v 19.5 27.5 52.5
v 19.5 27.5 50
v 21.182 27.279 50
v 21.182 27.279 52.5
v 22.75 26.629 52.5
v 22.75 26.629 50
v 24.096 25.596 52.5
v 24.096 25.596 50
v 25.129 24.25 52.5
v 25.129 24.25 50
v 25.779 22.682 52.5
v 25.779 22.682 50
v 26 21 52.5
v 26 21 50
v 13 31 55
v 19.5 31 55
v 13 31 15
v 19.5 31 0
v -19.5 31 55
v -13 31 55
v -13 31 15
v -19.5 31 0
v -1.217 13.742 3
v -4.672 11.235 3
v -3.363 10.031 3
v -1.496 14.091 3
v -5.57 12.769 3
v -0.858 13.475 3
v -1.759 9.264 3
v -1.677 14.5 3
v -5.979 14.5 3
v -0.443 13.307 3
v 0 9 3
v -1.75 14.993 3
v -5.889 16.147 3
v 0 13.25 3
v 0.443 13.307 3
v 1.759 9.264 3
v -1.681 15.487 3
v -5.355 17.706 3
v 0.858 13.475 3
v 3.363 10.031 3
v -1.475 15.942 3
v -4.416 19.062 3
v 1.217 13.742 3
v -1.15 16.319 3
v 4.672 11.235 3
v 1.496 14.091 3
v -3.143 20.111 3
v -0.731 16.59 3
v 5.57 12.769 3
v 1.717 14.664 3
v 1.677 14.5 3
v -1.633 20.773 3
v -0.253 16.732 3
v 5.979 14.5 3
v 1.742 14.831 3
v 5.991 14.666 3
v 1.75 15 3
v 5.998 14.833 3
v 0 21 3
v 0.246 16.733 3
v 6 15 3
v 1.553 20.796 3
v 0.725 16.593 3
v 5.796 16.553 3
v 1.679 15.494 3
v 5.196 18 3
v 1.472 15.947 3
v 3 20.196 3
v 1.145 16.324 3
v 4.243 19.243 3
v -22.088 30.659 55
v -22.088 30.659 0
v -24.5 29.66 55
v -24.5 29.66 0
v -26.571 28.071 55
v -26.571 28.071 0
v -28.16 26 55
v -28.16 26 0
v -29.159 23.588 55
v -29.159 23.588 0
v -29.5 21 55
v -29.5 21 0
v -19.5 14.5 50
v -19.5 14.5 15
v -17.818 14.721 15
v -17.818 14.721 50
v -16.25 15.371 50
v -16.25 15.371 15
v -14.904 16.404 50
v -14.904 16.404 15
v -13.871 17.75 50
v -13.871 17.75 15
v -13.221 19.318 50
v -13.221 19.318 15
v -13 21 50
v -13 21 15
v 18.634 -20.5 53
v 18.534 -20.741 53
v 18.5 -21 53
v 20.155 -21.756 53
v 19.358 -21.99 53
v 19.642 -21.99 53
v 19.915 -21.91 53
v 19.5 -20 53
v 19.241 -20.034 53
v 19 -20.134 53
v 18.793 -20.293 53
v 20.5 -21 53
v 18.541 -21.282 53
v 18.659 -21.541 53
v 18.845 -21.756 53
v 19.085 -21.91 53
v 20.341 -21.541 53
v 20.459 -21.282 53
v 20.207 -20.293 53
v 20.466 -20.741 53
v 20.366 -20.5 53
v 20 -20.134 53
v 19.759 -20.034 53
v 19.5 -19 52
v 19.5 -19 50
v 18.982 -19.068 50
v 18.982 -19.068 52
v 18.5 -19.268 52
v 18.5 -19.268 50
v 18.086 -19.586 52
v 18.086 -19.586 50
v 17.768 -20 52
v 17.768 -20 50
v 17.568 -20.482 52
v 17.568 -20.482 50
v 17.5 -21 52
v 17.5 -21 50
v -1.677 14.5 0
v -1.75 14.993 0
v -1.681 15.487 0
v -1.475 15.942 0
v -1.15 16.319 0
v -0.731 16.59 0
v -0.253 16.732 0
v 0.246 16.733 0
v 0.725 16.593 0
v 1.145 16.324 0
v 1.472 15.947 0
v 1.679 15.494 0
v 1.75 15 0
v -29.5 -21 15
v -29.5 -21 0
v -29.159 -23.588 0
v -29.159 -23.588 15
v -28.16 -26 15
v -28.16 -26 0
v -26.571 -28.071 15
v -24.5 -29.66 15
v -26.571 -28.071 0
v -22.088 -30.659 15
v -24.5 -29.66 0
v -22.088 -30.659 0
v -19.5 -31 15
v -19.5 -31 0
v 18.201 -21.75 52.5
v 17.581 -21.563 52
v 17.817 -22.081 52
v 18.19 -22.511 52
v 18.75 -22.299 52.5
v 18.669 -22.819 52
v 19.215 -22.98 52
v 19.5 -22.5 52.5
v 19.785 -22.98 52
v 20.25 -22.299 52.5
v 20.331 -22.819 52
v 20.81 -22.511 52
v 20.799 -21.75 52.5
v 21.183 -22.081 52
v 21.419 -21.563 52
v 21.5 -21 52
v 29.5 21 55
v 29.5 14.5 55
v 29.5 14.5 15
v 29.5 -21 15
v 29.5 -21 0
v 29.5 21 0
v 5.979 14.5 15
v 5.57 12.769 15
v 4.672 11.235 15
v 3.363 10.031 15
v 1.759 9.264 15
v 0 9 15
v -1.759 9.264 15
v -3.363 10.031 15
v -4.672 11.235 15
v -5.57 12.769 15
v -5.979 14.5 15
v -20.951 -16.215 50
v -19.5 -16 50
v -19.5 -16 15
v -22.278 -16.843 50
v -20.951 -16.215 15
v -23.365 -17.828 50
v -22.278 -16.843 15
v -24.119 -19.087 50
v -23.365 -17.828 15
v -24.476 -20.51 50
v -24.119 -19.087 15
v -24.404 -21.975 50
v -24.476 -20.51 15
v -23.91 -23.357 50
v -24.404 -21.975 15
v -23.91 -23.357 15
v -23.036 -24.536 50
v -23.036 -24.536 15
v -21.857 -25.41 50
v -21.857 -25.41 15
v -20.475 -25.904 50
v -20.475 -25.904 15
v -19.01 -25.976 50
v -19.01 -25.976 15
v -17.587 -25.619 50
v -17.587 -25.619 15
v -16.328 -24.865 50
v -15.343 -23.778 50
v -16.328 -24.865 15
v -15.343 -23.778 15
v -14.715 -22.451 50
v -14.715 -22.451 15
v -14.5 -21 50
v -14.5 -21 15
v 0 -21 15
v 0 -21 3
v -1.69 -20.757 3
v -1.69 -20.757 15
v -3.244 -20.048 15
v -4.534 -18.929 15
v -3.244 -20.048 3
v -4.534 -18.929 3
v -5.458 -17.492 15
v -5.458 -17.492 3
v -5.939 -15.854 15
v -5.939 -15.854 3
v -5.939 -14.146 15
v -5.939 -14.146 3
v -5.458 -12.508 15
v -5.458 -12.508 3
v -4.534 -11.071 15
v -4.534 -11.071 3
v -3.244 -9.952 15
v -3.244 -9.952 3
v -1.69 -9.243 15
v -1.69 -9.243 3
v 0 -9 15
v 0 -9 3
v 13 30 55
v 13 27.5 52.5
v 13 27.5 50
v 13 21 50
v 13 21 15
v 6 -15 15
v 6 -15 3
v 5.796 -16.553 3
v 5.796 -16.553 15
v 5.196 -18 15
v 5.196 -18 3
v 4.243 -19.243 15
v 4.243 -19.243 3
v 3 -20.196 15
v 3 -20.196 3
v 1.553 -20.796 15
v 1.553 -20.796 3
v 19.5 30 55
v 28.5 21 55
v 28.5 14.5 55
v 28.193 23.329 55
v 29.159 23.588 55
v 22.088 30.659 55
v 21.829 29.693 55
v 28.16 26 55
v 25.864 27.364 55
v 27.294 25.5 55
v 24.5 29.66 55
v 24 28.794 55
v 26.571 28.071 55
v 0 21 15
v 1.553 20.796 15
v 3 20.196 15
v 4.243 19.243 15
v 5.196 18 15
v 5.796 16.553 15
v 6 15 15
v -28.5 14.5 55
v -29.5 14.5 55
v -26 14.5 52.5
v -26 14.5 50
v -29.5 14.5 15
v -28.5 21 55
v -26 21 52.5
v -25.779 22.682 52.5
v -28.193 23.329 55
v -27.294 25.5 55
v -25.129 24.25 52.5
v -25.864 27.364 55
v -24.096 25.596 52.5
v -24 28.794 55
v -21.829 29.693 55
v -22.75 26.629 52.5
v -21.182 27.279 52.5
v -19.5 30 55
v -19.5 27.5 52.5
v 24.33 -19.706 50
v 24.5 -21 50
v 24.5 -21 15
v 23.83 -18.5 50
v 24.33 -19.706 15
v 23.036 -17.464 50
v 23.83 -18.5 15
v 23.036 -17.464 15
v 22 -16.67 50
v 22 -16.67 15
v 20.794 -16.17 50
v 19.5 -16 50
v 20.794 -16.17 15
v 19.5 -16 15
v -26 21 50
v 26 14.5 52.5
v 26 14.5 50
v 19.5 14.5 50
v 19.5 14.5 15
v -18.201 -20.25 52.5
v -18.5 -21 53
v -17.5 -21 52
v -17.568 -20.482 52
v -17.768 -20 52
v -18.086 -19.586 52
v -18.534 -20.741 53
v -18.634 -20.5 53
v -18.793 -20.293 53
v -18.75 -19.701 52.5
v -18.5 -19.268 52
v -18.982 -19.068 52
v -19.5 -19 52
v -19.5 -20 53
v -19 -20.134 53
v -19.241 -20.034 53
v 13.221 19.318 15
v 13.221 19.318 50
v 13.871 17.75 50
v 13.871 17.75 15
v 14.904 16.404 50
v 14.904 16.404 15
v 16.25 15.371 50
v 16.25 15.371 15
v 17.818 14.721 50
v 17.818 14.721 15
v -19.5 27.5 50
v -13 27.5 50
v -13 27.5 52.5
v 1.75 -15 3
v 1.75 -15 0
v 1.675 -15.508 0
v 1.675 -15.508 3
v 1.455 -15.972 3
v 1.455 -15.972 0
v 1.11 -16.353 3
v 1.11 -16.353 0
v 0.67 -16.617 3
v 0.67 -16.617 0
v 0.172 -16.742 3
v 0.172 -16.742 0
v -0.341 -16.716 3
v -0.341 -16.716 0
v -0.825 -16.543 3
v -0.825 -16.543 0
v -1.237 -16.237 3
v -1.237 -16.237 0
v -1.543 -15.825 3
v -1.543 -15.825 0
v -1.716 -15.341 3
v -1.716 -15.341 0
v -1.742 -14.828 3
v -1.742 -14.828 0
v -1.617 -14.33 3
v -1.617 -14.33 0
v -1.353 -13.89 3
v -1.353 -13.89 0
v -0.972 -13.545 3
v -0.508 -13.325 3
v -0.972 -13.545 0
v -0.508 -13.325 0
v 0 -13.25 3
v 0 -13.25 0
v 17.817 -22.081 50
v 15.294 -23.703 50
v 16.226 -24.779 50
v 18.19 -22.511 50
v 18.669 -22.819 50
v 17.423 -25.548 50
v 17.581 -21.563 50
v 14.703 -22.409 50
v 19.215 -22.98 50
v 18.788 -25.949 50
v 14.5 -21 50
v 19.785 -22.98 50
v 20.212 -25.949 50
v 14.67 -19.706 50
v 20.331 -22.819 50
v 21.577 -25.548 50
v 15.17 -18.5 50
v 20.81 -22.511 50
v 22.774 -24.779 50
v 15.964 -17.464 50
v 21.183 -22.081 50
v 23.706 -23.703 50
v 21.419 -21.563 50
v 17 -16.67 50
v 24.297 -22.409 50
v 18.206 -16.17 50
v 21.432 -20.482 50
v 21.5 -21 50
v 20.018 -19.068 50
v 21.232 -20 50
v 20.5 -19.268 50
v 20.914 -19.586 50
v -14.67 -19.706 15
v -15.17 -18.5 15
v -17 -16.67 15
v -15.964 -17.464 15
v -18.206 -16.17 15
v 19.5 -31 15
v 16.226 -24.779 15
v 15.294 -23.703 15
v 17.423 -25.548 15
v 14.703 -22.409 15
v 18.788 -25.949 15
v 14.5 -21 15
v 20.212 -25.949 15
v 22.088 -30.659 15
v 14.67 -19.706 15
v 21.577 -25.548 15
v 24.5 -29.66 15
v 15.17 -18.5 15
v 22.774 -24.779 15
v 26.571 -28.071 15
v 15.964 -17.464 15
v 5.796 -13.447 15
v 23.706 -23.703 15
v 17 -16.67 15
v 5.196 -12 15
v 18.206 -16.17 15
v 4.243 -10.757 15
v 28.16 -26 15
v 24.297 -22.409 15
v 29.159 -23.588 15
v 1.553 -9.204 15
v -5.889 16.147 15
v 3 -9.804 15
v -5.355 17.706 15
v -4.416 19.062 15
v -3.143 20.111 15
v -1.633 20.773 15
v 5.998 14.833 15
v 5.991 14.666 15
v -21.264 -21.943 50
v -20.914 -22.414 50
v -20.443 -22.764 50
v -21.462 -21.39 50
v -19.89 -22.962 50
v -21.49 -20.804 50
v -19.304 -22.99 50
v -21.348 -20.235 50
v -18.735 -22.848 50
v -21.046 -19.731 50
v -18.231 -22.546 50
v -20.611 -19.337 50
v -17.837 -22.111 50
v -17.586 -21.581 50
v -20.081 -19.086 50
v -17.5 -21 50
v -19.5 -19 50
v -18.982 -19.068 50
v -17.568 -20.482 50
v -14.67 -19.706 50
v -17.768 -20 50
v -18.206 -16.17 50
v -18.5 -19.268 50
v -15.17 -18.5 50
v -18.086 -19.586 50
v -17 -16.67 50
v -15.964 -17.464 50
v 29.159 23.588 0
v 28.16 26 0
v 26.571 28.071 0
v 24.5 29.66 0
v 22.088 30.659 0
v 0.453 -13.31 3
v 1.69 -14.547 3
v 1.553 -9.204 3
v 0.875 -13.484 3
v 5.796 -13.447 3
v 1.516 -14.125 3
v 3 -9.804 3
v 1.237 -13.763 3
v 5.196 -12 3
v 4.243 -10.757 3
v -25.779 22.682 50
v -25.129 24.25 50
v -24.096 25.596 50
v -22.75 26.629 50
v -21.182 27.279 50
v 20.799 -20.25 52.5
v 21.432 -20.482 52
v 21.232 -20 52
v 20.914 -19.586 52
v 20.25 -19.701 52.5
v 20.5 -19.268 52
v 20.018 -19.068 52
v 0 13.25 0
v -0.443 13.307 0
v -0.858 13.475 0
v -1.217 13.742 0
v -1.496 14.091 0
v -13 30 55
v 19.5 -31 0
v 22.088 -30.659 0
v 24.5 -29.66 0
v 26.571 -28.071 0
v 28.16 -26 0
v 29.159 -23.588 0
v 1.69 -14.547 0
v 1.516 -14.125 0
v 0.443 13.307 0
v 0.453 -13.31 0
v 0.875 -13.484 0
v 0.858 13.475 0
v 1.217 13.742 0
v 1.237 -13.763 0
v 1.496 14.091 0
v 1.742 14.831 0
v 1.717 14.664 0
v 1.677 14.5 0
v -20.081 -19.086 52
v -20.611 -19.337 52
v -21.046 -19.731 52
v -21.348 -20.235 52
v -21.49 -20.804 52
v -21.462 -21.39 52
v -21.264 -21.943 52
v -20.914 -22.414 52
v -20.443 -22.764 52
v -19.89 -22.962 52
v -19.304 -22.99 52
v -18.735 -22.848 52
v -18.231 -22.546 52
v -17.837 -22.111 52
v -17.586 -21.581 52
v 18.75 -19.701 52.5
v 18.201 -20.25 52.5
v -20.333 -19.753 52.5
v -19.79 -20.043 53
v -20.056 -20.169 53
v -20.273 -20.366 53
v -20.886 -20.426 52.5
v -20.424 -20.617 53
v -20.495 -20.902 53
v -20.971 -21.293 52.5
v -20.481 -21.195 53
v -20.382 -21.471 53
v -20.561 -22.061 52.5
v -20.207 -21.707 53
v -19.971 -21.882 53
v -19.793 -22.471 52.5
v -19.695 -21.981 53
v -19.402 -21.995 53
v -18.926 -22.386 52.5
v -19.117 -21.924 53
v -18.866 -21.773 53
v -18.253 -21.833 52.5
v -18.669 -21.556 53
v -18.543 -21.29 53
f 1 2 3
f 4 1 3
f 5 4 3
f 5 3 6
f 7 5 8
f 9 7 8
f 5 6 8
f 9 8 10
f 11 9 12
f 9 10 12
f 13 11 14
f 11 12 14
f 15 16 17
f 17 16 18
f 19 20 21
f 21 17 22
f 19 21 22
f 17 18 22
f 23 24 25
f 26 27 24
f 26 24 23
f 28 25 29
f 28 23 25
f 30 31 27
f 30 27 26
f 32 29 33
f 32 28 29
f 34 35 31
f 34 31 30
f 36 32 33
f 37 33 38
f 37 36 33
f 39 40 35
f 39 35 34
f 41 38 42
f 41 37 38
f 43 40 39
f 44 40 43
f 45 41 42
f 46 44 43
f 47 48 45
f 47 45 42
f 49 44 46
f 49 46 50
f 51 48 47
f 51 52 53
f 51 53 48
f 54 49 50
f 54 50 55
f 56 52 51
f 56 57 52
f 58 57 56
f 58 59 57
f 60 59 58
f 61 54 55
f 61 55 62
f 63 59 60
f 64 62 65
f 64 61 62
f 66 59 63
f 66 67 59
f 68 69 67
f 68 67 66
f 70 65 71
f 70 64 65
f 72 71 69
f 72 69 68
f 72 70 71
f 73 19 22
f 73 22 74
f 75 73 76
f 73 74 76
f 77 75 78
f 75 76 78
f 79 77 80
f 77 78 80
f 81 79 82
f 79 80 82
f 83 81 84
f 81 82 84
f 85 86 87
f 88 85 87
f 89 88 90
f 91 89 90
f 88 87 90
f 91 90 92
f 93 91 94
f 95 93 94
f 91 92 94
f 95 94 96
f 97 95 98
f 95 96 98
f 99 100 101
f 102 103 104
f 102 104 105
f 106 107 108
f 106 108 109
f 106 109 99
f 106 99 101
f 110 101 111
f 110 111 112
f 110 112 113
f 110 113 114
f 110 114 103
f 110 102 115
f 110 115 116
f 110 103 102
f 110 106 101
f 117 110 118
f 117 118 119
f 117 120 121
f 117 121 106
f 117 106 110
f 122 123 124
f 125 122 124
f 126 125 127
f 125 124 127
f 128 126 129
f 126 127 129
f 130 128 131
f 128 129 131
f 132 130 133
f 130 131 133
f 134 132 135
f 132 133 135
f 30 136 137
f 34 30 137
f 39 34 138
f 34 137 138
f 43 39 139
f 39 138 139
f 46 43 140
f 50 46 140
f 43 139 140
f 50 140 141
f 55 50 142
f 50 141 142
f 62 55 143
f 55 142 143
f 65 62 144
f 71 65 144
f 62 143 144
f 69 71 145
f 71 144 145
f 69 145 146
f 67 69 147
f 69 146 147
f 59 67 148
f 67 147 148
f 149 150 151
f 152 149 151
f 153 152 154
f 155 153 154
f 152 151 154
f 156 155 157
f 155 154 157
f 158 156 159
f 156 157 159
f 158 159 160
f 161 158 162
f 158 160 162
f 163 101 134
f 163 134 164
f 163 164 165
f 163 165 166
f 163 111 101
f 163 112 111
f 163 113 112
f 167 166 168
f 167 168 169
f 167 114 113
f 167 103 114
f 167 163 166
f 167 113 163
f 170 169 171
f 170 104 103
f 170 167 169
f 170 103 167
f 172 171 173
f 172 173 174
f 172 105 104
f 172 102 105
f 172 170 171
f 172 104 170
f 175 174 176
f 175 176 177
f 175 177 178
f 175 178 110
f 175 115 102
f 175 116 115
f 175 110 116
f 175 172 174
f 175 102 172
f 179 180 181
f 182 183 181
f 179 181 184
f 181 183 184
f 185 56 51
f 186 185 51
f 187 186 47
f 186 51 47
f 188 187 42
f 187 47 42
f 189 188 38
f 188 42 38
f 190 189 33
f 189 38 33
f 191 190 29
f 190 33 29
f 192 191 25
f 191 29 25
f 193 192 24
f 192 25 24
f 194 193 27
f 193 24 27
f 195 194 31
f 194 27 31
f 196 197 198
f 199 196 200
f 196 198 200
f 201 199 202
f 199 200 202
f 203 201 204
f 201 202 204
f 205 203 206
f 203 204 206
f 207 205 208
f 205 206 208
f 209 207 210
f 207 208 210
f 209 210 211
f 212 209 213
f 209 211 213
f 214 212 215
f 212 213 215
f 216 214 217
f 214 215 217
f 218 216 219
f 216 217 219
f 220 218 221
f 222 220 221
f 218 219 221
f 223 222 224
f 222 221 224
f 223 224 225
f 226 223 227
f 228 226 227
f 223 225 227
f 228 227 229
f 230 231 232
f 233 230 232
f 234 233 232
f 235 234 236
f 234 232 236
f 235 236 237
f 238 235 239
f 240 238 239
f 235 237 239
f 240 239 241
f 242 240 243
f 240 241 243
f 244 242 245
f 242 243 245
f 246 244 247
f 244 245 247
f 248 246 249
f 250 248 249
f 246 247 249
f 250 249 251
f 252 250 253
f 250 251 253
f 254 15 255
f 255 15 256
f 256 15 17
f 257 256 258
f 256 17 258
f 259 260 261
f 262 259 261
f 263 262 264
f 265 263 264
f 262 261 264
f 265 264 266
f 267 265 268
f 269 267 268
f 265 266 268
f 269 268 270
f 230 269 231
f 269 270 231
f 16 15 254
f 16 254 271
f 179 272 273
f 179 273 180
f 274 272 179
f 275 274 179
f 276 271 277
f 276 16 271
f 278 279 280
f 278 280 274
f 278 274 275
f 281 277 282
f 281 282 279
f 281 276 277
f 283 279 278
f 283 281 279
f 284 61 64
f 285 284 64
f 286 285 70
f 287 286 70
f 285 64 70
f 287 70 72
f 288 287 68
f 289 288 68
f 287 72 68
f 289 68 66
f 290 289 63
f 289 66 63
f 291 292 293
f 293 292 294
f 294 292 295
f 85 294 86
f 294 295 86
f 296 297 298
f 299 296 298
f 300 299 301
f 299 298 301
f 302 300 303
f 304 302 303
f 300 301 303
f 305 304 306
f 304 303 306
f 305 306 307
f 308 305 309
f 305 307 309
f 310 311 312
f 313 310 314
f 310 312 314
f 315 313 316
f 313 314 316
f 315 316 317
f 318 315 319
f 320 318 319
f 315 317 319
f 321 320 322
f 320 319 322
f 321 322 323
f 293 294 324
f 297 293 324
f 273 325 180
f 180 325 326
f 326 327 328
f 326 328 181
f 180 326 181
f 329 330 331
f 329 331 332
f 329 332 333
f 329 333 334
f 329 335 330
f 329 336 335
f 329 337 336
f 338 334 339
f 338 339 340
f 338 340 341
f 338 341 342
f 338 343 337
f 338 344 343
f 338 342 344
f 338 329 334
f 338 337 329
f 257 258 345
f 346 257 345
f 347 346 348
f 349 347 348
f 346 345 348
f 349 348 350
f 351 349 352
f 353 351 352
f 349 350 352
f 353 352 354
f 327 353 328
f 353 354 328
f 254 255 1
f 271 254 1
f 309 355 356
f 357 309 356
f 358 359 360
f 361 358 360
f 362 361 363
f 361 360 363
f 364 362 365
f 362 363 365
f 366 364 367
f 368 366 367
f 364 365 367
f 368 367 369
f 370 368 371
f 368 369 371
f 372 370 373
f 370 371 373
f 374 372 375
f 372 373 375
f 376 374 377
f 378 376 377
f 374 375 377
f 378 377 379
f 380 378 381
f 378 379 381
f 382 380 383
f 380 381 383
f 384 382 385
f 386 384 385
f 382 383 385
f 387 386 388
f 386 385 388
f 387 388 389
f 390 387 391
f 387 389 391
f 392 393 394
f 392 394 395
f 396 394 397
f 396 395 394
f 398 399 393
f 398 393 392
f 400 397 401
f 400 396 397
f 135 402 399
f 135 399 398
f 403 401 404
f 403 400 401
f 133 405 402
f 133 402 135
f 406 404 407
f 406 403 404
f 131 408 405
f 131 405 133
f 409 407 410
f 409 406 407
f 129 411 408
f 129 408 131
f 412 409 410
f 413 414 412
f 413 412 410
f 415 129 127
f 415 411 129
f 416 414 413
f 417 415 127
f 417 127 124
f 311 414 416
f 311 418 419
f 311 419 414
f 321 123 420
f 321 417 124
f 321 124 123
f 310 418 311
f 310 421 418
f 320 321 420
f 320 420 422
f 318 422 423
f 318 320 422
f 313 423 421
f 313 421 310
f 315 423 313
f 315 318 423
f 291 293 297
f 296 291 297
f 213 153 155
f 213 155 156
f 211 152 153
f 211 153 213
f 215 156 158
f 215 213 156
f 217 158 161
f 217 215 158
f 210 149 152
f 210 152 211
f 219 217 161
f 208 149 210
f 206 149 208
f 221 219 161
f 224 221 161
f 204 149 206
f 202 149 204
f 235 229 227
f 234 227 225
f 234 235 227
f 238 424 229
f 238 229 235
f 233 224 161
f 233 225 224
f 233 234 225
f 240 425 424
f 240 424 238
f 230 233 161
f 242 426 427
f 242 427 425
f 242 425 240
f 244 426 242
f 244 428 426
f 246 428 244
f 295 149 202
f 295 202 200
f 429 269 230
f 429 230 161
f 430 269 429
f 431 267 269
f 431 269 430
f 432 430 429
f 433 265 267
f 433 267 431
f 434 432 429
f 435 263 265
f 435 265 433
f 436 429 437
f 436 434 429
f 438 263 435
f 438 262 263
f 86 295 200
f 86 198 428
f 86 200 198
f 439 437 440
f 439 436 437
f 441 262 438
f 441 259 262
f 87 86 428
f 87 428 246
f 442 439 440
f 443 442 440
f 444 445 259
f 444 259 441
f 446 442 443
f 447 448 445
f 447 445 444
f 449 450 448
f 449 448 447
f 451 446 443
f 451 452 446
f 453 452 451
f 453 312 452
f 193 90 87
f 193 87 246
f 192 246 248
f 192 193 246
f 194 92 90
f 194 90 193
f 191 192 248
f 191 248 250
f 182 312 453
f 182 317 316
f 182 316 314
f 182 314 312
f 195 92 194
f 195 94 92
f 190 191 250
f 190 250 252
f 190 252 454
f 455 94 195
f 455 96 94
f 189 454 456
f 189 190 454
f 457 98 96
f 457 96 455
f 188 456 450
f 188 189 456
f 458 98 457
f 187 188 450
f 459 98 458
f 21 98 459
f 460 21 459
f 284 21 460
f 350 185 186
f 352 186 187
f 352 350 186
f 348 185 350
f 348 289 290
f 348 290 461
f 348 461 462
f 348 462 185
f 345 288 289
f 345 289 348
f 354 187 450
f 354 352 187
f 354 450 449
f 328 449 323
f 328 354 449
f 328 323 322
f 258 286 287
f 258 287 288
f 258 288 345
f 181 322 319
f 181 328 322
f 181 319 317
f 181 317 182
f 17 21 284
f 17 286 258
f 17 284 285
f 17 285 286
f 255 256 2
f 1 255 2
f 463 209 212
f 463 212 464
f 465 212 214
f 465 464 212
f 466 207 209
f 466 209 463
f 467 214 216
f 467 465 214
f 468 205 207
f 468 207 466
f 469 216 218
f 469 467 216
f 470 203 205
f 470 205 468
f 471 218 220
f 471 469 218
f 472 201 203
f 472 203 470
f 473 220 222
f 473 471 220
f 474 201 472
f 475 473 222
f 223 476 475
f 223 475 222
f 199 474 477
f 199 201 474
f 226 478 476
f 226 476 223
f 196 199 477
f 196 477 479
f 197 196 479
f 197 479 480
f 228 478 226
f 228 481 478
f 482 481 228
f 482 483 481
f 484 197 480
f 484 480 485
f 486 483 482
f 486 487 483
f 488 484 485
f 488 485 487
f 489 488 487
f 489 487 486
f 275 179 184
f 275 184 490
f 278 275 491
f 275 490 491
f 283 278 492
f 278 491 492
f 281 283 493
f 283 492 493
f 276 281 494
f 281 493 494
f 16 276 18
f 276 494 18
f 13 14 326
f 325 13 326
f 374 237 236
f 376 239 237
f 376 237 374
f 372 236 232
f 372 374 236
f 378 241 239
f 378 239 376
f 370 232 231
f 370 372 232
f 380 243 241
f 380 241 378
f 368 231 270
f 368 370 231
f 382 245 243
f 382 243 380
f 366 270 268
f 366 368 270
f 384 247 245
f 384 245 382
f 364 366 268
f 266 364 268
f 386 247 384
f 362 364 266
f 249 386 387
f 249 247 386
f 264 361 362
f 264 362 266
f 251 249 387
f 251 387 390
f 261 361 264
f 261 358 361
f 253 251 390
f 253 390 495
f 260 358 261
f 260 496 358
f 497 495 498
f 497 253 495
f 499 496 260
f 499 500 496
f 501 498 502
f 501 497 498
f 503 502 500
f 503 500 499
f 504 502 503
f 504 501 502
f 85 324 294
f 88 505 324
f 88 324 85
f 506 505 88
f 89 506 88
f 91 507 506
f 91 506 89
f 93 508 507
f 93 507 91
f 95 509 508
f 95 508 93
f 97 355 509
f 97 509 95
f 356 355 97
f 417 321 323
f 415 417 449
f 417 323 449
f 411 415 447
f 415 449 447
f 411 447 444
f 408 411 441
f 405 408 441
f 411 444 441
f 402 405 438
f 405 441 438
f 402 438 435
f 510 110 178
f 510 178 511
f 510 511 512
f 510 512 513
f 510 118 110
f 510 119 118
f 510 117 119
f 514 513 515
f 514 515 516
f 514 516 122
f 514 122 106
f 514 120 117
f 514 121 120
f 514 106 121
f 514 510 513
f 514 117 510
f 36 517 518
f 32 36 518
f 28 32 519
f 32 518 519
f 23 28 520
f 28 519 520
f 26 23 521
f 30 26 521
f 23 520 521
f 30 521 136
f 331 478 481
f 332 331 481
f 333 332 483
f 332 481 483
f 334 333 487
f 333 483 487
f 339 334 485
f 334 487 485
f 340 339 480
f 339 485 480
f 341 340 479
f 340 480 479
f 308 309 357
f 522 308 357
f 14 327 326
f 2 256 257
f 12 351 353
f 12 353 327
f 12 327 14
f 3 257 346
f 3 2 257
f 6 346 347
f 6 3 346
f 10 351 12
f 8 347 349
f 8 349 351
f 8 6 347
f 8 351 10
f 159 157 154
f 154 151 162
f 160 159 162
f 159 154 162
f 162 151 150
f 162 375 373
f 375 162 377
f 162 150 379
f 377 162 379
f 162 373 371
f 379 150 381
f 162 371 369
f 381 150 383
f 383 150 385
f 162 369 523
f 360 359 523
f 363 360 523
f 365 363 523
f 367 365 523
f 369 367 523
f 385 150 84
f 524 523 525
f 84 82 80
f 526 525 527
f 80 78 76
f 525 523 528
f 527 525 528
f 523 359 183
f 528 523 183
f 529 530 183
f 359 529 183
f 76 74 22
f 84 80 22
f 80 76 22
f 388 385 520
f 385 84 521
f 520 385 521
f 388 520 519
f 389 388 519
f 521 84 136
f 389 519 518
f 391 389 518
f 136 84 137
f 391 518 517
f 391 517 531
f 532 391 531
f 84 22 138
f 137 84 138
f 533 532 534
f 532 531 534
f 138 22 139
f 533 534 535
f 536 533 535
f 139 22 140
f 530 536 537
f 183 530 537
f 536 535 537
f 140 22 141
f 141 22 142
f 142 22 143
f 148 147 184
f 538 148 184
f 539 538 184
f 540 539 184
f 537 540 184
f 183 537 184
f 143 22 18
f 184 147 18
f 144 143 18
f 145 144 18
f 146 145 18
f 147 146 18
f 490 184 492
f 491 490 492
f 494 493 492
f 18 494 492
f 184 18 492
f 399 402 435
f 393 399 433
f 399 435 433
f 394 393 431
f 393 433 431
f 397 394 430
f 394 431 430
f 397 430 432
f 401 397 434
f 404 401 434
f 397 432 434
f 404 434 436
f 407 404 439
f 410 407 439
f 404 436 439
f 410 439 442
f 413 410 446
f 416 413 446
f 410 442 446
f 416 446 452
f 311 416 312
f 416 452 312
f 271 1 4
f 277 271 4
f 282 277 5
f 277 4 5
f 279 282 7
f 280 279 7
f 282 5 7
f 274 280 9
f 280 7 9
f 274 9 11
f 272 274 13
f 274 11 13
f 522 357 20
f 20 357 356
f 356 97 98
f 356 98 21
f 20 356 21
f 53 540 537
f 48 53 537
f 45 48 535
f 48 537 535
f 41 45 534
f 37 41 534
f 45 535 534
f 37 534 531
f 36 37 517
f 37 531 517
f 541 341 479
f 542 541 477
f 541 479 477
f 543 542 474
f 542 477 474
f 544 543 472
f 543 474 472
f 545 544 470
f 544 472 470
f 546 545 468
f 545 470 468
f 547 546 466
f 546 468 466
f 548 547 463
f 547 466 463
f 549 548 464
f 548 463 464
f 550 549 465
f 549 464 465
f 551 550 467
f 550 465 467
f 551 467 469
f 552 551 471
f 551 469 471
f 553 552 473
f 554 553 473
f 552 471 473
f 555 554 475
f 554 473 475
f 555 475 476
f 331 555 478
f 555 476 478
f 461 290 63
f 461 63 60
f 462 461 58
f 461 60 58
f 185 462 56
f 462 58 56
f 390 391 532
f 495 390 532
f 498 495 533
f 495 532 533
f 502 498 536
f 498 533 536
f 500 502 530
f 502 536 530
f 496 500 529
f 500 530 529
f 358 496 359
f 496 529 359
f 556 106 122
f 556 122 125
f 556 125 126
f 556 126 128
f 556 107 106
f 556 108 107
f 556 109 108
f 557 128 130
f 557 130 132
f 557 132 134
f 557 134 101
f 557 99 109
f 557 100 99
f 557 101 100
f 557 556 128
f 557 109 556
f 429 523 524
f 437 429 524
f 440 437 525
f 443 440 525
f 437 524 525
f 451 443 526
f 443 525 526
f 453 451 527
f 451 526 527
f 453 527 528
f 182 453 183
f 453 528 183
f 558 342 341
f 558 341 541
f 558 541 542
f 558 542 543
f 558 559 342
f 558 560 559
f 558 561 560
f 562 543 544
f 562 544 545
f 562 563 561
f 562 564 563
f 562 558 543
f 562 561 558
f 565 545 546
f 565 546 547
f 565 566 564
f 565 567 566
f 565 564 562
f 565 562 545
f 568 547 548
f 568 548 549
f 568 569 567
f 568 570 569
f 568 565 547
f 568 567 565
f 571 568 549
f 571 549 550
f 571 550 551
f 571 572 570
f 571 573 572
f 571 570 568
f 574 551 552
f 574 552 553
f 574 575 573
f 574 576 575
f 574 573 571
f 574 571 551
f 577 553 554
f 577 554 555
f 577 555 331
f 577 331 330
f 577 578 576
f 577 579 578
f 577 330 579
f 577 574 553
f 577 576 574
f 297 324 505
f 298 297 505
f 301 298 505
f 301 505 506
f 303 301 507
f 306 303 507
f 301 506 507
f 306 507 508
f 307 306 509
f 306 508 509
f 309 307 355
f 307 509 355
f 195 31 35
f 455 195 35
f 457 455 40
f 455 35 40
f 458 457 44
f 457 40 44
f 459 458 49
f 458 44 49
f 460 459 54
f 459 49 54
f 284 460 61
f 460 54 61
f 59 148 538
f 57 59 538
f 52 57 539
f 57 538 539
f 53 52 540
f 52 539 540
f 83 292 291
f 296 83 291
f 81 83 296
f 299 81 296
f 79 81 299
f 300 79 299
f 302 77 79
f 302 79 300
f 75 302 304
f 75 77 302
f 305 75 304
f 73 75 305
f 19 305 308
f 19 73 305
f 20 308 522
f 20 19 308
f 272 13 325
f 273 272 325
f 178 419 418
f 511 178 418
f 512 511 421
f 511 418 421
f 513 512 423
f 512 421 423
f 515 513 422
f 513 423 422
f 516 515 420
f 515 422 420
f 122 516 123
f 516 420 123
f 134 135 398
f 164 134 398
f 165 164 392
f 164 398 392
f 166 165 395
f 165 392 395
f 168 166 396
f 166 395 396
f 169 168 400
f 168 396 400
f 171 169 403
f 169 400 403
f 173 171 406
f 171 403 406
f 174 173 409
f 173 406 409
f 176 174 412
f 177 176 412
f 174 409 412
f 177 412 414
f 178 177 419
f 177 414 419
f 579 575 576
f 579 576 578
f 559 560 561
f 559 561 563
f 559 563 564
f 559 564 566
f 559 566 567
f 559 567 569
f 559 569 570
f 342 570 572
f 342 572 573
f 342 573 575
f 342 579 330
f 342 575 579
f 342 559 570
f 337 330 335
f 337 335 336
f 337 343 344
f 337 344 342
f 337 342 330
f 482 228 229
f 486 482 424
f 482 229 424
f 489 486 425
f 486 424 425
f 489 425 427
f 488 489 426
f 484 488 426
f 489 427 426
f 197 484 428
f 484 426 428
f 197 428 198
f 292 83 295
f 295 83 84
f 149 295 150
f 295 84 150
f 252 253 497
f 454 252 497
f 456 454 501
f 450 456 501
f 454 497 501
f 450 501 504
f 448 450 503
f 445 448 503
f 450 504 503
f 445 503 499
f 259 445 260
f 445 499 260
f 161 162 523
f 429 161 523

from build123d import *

# Parameters (mm, degrees)
F0_W     = 26
F0_H     = 3.5
F1_DEPTH = 15
F2_DEPTH = 50
F3_DEPTH = 53
F4_DEPTH = 3
F5_DEPTH = 55
F6_SIZE  = 2.5
F7_SIZE  = 1


# Not quite as in the source:
# - a feature names something its author has since deleted; it is built from what else it names


with BuildPart() as f1:
    # F0 (on Top) → F1 (new body)
    with BuildSketch(Plane.XY):
        with Locations((0, 29.25)):
            Rectangle(F0_W, F0_H)
        with BuildLine():
            Line((29.5, -21), (29.5, 14.5))
            Line((29.5, 14.5), (26, 14.5))
            Line((26, 14.5), (19.5, 14.5))
            Line((19.5, 14.5), (19.5, 0))
            Line((19.5, 0), (19.5, -16))
            ThreePointArc((19.5, -16), (23.0355339059, -17.4644660941), (24.5, -21))
            ThreePointArc((24.5, -21), (19.5, -26), (14.5, -21))
            Line((14.5, -21), (0, -21))
            Line((0, -21), (-14.5, -21))
            ThreePointArc((-14.5, -21), (-23.0355339059, -24.5355339059), (-19.5, -16))
            Line((-19.5, -16), (-19.5, 14.5))
            Line((-19.5, 14.5), (-26, 14.5))
            Line((-26, 14.5), (-29.5, 14.5))
            Line((-29.5, 14.5), (-29.5, -21))
            ThreePointArc((-29.5, -21), (-26.5710678119, -28.0710678119), (-19.5, -31))
            Line((-19.5, -31), (19.5, -31))
            ThreePointArc((19.5, -31), (26.5710678119, -28.0710678119), (29.5, -21))
        make_face()
        with BuildLine():
            Line((19.5, 0), (19.5, 14.5))
            Line((19.5, 14.5), (5.9791303716, 14.5))
            ThreePointArc((5.9791303716, 14.5), (4.0620192023, 10.5841195668), (0, 9))
            Line((0, 9), (0, 0))
            Line((0, 0), (19.5, 0))
        make_face()
        with BuildLine():
            Line((-5.9791303716, 14.5), (-19.5, 14.5))
            Line((-19.5, 14.5), (-19.5, -16))
            ThreePointArc((-19.5, -16), (-15.9644660941, -17.4644660941), (-14.5, -21))
            Line((-14.5, -21), (0, -21))
            ThreePointArc((0, -21), (-6, -15), (0, -9))
            Line((0, -9), (0, 0))
            Line((0, 0), (0, 9))
            ThreePointArc((0, 9), (-4.0620192023, 10.5841195668), (-5.9791303716, 14.5))
        make_face()
        with BuildLine():
            Line((19.5, -16), (19.5, 0))
            Line((19.5, 0), (0, 0))
            Line((0, 0), (0, -9))
            ThreePointArc((0, -9), (4.2426406871, -10.7573593129), (6, -15))
            ThreePointArc((6, -15), (4.2426406871, -19.2426406871), (0, -21))
            Line((0, -21), (14.5, -21))
            ThreePointArc((14.5, -21), (15.9644660941, -17.4644660941), (19.5, -16))
        make_face()
        Polygon((13, 21), (13, 27.5), (-13, 27.5), (-13, 21), (0, 21), align=None)
        with BuildLine():
            Line((0, 21), (-13, 21))
            ThreePointArc((-13, 21), (-14.9038059223, 16.4038059223), (-19.5, 14.5))
            Line((-19.5, 14.5), (-5.9791303716, 14.5))
            ThreePointArc((-5.9791303716, 14.5), (-4.4158804332, 19.0620192023), (0, 21))
        make_face()
        with BuildLine():
            ThreePointArc((19.5, 14.5), (14.9038059223, 16.4038059223), (13, 21))
            Line((13, 21), (0, 21))
            ThreePointArc((0, 21), (4.2426406871, 19.2426406871), (6, 15))
            ThreePointArc((6, 15), (5.9947803225, 14.7497823241), (5.9791303716, 14.5))
            Line((5.9791303716, 14.5), (19.5, 14.5))
        make_face()
    extrude(amount=F1_DEPTH)

    # F0 (on Top) → F2 (join)
    with BuildSketch(Plane.XY):
        with BuildLine():
            ThreePointArc((-13, 21), (-14.9038059223, 25.5961940777), (-19.5, 27.5))
            ThreePointArc((-19.5, 27.5), (-24.0961940777, 25.5961940777), (-26, 21))
            ThreePointArc((-26, 21), (-24.0961940777, 16.4038059223), (-19.5, 14.5))
            Line((-19.5, 14.5), (-19.5, 21))
            Line((-19.5, 21), (-13, 21))
        make_face()
        with BuildLine():
            ThreePointArc((-19.5, 14.5), (-14.9038059223, 16.4038059223), (-13, 21))
            Line((-13, 21), (-19.5, 21))
            Line((-19.5, 21), (-19.5, 14.5))
        make_face()
        with BuildLine():
            Line((-13, 21), (-13, 27.5))
            Line((-13, 27.5), (-19.5, 27.5))
            ThreePointArc((-19.5, 27.5), (-14.9038059223, 25.5961940777), (-13, 21))
        make_face()
        with BuildLine():
            ThreePointArc((26, 21), (24.0961940777, 25.5961940777), (19.5, 27.5))
            ThreePointArc((19.5, 27.5), (14.9038059223, 25.5961940777), (13, 21))
            Line((13, 21), (19.5, 21))
            Line((19.5, 21), (19.5, 14.5))
            ThreePointArc((19.5, 14.5), (24.0961940777, 16.4038059223), (26, 21))
        make_face()
        with BuildLine():
            Line((19.5, 21), (13, 21))
            ThreePointArc((13, 21), (14.9038059223, 16.4038059223), (19.5, 14.5))
            Line((19.5, 14.5), (19.5, 21))
        make_face()
        with BuildLine():
            ThreePointArc((24.5, -21), (23.0355339059, -17.4644660941), (19.5, -16))
            Line((19.5, -16), (19.5, -19))
            ThreePointArc((19.5, -19), (20.9142135624, -19.5857864376), (21.5, -21))
            ThreePointArc((21.5, -21), (19.5, -23), (17.5, -21))
            Line((17.5, -21), (14.5, -21))
            ThreePointArc((14.5, -21), (19.5, -26), (24.5, -21))
        make_face()
        with BuildLine():
            Line((19.5, -19), (19.5, -16))
            ThreePointArc((19.5, -16), (15.9644660941, -17.4644660941), (14.5, -21))
            Line((14.5, -21), (17.5, -21))
            ThreePointArc((17.5, -21), (18.0857864376, -19.5857864376), (19.5, -19))
        make_face()
        with BuildLine():
            Line((-19.5, -19), (-19.5, -16))
            ThreePointArc((-19.5, -16), (-23.0355339059, -24.5355339059), (-14.5, -21))
            Line((-14.5, -21), (-17.5, -21))
            ThreePointArc((-17.5, -21), (-20.9142135624, -22.4142135624), (-19.5, -19))
        make_face()
        with BuildLine():
            ThreePointArc((-14.5, -21), (-15.9644660941, -17.4644660941), (-19.5, -16))
            Line((-19.5, -16), (-19.5, -19))
            ThreePointArc((-19.5, -19), (-18.0857864376, -19.5857864376), (-17.5, -21))
            Line((-17.5, -21), (-14.5, -21))
        make_face()
        with BuildLine():
            Line((19.5, 27.5), (13, 27.5))
            Line((13, 27.5), (13, 21))
            ThreePointArc((13, 21), (14.9038059223, 25.5961940777), (19.5, 27.5))
        make_face()
        with BuildLine():
            Line((19.5, 14.5), (26, 14.5))
            Line((26, 14.5), (26, 21))
            ThreePointArc((26, 21), (24.0961940777, 16.4038059223), (19.5, 14.5))
        make_face()
        with BuildLine():
            ThreePointArc((-19.5, 14.5), (-24.0961940777, 16.4038059223), (-26, 21))
            Line((-26, 21), (-26, 14.5))
            Line((-26, 14.5), (-19.5, 14.5))
        make_face()
    extrude(amount=F2_DEPTH)

    # F0 (on Top) → F3 (join)
    with BuildSketch(Plane.XY):
        with BuildLine():
            Line((-19.5, -21), (-19.5, -19))
            ThreePointArc((-19.5, -19), (-20.9142135624, -22.4142135624), (-17.5, -21))
            Line((-17.5, -21), (-19.5, -21))
        make_face()
        with BuildLine():
            ThreePointArc((-17.5, -21), (-18.0857864376, -19.5857864376), (-19.5, -19))
            Line((-19.5, -19), (-19.5, -21))
            Line((-19.5, -21), (-17.5, -21))
        make_face()
        with BuildLine():
            Line((19.5, -21), (19.5, -19))
            ThreePointArc((19.5, -19), (18.0857864376, -19.5857864376), (17.5, -21))
            Line((17.5, -21), (19.5, -21))
        make_face()
        with BuildLine():
            ThreePointArc((21.5, -21), (20.9142135624, -19.5857864376), (19.5, -19))
            Line((19.5, -19), (19.5, -21))
            Line((19.5, -21), (17.5, -21))
            ThreePointArc((17.5, -21), (19.5, -23), (21.5, -21))
        make_face()
    extrude(amount=F3_DEPTH)

    # F0 (on Top) → F4 (join)
    with BuildSketch(Plane.XY):
        with BuildLine():
            Line((-1.6770509831, 14.5), (-5.9791303716, 14.5))
            ThreePointArc((-5.9791303716, 14.5), (-4.0620192023, 10.5841195668), (0, 9))
            Line((0, 9), (0, 13.25))
            ThreePointArc((0, 13.25), (-1.0458250332, 13.59687848), (-1.6770509831, 14.5))
        make_face()
        with BuildLine():
            ThreePointArc((0, 9), (4.0620192023, 10.5841195668), (5.9791303716, 14.5))
            Line((5.9791303716, 14.5), (1.6770509831, 14.5))
            ThreePointArc((1.6770509831, 14.5), (1.0458250332, 13.59687848), (0, 13.25))
            Line((0, 13.25), (0, 9))
        make_face()
        with BuildLine():
            ThreePointArc((6, 15), (4.2426406871, 19.2426406871), (0, 21))
            ThreePointArc((0, 21), (-4.4158804332, 19.0620192023), (-5.9791303716, 14.5))
            Line((-5.9791303716, 14.5), (-1.6770509831, 14.5))
            ThreePointArc((-1.6770509831, 14.5), (-0.2526467688, 16.7316667145), (1.75, 15))
            ThreePointArc((1.75, 15), (1.7316667145, 14.7473532312), (1.6770509831, 14.5))
            Line((1.6770509831, 14.5), (5.9791303716, 14.5))
            ThreePointArc((5.9791303716, 14.5), (5.9947803225, 14.7497823241), (6, 15))
        make_face()
        with BuildLine():
            ThreePointArc((6, -15), (4.2426406871, -10.7573593129), (0, -9))
            ThreePointArc((0, -9), (-6, -15), (0, -21))
            ThreePointArc((0, -21), (4.2426406871, -19.2426406871), (6, -15))
        make_face()
        with BuildLine():
            ThreePointArc((1.75, -15), (-1.2374368671, -16.2374368671), (0, -13.25))
            ThreePointArc((0, -13.25), (1.2374368671, -13.7625631329), (1.75, -15))
        make_face(mode=Mode.SUBTRACT)
    extrude(amount=F4_DEPTH)

    # F0 (on Top) → F5 (join)
    with BuildSketch(Plane.XY):
        with BuildLine():
            ThreePointArc((29.5, 21), (26.5710678119, 28.0710678119), (19.5, 31))
            Line((19.5, 31), (13, 31))
            Line((13, 31), (13, 27.5))
            Line((13, 27.5), (19.5, 27.5))
            ThreePointArc((19.5, 27.5), (24.0961940777, 25.5961940777), (26, 21))
            Line((26, 21), (26, 14.5))
            Line((26, 14.5), (29.5, 14.5))
            Line((29.5, 14.5), (29.5, 21))
        make_face()
        with BuildLine():
            Line((-13, 27.5), (-13, 31))
            Line((-13, 31), (-19.5, 31))
            ThreePointArc((-19.5, 31), (-26.5710678119, 28.0710678119), (-29.5, 21))
            Line((-29.5, 21), (-29.5, 14.5))
            Line((-29.5, 14.5), (-26, 14.5))
            Line((-26, 14.5), (-26, 21))
            ThreePointArc((-26, 21), (-24.0961940777, 25.5961940777), (-19.5, 27.5))
            Line((-19.5, 27.5), (-13, 27.5))
        make_face()
    extrude(amount=F5_DEPTH)

    # F6
    f6_edges = [f1.edges().sort_by_distance(p)[0] for p in [
        (24.096194, 25.596194, 55),
        (16.25, 27.5, 55),
        (-16.25, 27.5, 55),
        (-24.096194, 25.596194, 55),
    ]]
    chamfer(f6_edges, length=F6_SIZE)

    # F7
    f7_edges = [f1.edges().sort_by_distance(p)[0] for p in [
        (-21.5, -21, 53),
        (21.5, -21, 53),
    ]]
    chamfer(f7_edges, length=F7_SIZE)


solid = f1.part
